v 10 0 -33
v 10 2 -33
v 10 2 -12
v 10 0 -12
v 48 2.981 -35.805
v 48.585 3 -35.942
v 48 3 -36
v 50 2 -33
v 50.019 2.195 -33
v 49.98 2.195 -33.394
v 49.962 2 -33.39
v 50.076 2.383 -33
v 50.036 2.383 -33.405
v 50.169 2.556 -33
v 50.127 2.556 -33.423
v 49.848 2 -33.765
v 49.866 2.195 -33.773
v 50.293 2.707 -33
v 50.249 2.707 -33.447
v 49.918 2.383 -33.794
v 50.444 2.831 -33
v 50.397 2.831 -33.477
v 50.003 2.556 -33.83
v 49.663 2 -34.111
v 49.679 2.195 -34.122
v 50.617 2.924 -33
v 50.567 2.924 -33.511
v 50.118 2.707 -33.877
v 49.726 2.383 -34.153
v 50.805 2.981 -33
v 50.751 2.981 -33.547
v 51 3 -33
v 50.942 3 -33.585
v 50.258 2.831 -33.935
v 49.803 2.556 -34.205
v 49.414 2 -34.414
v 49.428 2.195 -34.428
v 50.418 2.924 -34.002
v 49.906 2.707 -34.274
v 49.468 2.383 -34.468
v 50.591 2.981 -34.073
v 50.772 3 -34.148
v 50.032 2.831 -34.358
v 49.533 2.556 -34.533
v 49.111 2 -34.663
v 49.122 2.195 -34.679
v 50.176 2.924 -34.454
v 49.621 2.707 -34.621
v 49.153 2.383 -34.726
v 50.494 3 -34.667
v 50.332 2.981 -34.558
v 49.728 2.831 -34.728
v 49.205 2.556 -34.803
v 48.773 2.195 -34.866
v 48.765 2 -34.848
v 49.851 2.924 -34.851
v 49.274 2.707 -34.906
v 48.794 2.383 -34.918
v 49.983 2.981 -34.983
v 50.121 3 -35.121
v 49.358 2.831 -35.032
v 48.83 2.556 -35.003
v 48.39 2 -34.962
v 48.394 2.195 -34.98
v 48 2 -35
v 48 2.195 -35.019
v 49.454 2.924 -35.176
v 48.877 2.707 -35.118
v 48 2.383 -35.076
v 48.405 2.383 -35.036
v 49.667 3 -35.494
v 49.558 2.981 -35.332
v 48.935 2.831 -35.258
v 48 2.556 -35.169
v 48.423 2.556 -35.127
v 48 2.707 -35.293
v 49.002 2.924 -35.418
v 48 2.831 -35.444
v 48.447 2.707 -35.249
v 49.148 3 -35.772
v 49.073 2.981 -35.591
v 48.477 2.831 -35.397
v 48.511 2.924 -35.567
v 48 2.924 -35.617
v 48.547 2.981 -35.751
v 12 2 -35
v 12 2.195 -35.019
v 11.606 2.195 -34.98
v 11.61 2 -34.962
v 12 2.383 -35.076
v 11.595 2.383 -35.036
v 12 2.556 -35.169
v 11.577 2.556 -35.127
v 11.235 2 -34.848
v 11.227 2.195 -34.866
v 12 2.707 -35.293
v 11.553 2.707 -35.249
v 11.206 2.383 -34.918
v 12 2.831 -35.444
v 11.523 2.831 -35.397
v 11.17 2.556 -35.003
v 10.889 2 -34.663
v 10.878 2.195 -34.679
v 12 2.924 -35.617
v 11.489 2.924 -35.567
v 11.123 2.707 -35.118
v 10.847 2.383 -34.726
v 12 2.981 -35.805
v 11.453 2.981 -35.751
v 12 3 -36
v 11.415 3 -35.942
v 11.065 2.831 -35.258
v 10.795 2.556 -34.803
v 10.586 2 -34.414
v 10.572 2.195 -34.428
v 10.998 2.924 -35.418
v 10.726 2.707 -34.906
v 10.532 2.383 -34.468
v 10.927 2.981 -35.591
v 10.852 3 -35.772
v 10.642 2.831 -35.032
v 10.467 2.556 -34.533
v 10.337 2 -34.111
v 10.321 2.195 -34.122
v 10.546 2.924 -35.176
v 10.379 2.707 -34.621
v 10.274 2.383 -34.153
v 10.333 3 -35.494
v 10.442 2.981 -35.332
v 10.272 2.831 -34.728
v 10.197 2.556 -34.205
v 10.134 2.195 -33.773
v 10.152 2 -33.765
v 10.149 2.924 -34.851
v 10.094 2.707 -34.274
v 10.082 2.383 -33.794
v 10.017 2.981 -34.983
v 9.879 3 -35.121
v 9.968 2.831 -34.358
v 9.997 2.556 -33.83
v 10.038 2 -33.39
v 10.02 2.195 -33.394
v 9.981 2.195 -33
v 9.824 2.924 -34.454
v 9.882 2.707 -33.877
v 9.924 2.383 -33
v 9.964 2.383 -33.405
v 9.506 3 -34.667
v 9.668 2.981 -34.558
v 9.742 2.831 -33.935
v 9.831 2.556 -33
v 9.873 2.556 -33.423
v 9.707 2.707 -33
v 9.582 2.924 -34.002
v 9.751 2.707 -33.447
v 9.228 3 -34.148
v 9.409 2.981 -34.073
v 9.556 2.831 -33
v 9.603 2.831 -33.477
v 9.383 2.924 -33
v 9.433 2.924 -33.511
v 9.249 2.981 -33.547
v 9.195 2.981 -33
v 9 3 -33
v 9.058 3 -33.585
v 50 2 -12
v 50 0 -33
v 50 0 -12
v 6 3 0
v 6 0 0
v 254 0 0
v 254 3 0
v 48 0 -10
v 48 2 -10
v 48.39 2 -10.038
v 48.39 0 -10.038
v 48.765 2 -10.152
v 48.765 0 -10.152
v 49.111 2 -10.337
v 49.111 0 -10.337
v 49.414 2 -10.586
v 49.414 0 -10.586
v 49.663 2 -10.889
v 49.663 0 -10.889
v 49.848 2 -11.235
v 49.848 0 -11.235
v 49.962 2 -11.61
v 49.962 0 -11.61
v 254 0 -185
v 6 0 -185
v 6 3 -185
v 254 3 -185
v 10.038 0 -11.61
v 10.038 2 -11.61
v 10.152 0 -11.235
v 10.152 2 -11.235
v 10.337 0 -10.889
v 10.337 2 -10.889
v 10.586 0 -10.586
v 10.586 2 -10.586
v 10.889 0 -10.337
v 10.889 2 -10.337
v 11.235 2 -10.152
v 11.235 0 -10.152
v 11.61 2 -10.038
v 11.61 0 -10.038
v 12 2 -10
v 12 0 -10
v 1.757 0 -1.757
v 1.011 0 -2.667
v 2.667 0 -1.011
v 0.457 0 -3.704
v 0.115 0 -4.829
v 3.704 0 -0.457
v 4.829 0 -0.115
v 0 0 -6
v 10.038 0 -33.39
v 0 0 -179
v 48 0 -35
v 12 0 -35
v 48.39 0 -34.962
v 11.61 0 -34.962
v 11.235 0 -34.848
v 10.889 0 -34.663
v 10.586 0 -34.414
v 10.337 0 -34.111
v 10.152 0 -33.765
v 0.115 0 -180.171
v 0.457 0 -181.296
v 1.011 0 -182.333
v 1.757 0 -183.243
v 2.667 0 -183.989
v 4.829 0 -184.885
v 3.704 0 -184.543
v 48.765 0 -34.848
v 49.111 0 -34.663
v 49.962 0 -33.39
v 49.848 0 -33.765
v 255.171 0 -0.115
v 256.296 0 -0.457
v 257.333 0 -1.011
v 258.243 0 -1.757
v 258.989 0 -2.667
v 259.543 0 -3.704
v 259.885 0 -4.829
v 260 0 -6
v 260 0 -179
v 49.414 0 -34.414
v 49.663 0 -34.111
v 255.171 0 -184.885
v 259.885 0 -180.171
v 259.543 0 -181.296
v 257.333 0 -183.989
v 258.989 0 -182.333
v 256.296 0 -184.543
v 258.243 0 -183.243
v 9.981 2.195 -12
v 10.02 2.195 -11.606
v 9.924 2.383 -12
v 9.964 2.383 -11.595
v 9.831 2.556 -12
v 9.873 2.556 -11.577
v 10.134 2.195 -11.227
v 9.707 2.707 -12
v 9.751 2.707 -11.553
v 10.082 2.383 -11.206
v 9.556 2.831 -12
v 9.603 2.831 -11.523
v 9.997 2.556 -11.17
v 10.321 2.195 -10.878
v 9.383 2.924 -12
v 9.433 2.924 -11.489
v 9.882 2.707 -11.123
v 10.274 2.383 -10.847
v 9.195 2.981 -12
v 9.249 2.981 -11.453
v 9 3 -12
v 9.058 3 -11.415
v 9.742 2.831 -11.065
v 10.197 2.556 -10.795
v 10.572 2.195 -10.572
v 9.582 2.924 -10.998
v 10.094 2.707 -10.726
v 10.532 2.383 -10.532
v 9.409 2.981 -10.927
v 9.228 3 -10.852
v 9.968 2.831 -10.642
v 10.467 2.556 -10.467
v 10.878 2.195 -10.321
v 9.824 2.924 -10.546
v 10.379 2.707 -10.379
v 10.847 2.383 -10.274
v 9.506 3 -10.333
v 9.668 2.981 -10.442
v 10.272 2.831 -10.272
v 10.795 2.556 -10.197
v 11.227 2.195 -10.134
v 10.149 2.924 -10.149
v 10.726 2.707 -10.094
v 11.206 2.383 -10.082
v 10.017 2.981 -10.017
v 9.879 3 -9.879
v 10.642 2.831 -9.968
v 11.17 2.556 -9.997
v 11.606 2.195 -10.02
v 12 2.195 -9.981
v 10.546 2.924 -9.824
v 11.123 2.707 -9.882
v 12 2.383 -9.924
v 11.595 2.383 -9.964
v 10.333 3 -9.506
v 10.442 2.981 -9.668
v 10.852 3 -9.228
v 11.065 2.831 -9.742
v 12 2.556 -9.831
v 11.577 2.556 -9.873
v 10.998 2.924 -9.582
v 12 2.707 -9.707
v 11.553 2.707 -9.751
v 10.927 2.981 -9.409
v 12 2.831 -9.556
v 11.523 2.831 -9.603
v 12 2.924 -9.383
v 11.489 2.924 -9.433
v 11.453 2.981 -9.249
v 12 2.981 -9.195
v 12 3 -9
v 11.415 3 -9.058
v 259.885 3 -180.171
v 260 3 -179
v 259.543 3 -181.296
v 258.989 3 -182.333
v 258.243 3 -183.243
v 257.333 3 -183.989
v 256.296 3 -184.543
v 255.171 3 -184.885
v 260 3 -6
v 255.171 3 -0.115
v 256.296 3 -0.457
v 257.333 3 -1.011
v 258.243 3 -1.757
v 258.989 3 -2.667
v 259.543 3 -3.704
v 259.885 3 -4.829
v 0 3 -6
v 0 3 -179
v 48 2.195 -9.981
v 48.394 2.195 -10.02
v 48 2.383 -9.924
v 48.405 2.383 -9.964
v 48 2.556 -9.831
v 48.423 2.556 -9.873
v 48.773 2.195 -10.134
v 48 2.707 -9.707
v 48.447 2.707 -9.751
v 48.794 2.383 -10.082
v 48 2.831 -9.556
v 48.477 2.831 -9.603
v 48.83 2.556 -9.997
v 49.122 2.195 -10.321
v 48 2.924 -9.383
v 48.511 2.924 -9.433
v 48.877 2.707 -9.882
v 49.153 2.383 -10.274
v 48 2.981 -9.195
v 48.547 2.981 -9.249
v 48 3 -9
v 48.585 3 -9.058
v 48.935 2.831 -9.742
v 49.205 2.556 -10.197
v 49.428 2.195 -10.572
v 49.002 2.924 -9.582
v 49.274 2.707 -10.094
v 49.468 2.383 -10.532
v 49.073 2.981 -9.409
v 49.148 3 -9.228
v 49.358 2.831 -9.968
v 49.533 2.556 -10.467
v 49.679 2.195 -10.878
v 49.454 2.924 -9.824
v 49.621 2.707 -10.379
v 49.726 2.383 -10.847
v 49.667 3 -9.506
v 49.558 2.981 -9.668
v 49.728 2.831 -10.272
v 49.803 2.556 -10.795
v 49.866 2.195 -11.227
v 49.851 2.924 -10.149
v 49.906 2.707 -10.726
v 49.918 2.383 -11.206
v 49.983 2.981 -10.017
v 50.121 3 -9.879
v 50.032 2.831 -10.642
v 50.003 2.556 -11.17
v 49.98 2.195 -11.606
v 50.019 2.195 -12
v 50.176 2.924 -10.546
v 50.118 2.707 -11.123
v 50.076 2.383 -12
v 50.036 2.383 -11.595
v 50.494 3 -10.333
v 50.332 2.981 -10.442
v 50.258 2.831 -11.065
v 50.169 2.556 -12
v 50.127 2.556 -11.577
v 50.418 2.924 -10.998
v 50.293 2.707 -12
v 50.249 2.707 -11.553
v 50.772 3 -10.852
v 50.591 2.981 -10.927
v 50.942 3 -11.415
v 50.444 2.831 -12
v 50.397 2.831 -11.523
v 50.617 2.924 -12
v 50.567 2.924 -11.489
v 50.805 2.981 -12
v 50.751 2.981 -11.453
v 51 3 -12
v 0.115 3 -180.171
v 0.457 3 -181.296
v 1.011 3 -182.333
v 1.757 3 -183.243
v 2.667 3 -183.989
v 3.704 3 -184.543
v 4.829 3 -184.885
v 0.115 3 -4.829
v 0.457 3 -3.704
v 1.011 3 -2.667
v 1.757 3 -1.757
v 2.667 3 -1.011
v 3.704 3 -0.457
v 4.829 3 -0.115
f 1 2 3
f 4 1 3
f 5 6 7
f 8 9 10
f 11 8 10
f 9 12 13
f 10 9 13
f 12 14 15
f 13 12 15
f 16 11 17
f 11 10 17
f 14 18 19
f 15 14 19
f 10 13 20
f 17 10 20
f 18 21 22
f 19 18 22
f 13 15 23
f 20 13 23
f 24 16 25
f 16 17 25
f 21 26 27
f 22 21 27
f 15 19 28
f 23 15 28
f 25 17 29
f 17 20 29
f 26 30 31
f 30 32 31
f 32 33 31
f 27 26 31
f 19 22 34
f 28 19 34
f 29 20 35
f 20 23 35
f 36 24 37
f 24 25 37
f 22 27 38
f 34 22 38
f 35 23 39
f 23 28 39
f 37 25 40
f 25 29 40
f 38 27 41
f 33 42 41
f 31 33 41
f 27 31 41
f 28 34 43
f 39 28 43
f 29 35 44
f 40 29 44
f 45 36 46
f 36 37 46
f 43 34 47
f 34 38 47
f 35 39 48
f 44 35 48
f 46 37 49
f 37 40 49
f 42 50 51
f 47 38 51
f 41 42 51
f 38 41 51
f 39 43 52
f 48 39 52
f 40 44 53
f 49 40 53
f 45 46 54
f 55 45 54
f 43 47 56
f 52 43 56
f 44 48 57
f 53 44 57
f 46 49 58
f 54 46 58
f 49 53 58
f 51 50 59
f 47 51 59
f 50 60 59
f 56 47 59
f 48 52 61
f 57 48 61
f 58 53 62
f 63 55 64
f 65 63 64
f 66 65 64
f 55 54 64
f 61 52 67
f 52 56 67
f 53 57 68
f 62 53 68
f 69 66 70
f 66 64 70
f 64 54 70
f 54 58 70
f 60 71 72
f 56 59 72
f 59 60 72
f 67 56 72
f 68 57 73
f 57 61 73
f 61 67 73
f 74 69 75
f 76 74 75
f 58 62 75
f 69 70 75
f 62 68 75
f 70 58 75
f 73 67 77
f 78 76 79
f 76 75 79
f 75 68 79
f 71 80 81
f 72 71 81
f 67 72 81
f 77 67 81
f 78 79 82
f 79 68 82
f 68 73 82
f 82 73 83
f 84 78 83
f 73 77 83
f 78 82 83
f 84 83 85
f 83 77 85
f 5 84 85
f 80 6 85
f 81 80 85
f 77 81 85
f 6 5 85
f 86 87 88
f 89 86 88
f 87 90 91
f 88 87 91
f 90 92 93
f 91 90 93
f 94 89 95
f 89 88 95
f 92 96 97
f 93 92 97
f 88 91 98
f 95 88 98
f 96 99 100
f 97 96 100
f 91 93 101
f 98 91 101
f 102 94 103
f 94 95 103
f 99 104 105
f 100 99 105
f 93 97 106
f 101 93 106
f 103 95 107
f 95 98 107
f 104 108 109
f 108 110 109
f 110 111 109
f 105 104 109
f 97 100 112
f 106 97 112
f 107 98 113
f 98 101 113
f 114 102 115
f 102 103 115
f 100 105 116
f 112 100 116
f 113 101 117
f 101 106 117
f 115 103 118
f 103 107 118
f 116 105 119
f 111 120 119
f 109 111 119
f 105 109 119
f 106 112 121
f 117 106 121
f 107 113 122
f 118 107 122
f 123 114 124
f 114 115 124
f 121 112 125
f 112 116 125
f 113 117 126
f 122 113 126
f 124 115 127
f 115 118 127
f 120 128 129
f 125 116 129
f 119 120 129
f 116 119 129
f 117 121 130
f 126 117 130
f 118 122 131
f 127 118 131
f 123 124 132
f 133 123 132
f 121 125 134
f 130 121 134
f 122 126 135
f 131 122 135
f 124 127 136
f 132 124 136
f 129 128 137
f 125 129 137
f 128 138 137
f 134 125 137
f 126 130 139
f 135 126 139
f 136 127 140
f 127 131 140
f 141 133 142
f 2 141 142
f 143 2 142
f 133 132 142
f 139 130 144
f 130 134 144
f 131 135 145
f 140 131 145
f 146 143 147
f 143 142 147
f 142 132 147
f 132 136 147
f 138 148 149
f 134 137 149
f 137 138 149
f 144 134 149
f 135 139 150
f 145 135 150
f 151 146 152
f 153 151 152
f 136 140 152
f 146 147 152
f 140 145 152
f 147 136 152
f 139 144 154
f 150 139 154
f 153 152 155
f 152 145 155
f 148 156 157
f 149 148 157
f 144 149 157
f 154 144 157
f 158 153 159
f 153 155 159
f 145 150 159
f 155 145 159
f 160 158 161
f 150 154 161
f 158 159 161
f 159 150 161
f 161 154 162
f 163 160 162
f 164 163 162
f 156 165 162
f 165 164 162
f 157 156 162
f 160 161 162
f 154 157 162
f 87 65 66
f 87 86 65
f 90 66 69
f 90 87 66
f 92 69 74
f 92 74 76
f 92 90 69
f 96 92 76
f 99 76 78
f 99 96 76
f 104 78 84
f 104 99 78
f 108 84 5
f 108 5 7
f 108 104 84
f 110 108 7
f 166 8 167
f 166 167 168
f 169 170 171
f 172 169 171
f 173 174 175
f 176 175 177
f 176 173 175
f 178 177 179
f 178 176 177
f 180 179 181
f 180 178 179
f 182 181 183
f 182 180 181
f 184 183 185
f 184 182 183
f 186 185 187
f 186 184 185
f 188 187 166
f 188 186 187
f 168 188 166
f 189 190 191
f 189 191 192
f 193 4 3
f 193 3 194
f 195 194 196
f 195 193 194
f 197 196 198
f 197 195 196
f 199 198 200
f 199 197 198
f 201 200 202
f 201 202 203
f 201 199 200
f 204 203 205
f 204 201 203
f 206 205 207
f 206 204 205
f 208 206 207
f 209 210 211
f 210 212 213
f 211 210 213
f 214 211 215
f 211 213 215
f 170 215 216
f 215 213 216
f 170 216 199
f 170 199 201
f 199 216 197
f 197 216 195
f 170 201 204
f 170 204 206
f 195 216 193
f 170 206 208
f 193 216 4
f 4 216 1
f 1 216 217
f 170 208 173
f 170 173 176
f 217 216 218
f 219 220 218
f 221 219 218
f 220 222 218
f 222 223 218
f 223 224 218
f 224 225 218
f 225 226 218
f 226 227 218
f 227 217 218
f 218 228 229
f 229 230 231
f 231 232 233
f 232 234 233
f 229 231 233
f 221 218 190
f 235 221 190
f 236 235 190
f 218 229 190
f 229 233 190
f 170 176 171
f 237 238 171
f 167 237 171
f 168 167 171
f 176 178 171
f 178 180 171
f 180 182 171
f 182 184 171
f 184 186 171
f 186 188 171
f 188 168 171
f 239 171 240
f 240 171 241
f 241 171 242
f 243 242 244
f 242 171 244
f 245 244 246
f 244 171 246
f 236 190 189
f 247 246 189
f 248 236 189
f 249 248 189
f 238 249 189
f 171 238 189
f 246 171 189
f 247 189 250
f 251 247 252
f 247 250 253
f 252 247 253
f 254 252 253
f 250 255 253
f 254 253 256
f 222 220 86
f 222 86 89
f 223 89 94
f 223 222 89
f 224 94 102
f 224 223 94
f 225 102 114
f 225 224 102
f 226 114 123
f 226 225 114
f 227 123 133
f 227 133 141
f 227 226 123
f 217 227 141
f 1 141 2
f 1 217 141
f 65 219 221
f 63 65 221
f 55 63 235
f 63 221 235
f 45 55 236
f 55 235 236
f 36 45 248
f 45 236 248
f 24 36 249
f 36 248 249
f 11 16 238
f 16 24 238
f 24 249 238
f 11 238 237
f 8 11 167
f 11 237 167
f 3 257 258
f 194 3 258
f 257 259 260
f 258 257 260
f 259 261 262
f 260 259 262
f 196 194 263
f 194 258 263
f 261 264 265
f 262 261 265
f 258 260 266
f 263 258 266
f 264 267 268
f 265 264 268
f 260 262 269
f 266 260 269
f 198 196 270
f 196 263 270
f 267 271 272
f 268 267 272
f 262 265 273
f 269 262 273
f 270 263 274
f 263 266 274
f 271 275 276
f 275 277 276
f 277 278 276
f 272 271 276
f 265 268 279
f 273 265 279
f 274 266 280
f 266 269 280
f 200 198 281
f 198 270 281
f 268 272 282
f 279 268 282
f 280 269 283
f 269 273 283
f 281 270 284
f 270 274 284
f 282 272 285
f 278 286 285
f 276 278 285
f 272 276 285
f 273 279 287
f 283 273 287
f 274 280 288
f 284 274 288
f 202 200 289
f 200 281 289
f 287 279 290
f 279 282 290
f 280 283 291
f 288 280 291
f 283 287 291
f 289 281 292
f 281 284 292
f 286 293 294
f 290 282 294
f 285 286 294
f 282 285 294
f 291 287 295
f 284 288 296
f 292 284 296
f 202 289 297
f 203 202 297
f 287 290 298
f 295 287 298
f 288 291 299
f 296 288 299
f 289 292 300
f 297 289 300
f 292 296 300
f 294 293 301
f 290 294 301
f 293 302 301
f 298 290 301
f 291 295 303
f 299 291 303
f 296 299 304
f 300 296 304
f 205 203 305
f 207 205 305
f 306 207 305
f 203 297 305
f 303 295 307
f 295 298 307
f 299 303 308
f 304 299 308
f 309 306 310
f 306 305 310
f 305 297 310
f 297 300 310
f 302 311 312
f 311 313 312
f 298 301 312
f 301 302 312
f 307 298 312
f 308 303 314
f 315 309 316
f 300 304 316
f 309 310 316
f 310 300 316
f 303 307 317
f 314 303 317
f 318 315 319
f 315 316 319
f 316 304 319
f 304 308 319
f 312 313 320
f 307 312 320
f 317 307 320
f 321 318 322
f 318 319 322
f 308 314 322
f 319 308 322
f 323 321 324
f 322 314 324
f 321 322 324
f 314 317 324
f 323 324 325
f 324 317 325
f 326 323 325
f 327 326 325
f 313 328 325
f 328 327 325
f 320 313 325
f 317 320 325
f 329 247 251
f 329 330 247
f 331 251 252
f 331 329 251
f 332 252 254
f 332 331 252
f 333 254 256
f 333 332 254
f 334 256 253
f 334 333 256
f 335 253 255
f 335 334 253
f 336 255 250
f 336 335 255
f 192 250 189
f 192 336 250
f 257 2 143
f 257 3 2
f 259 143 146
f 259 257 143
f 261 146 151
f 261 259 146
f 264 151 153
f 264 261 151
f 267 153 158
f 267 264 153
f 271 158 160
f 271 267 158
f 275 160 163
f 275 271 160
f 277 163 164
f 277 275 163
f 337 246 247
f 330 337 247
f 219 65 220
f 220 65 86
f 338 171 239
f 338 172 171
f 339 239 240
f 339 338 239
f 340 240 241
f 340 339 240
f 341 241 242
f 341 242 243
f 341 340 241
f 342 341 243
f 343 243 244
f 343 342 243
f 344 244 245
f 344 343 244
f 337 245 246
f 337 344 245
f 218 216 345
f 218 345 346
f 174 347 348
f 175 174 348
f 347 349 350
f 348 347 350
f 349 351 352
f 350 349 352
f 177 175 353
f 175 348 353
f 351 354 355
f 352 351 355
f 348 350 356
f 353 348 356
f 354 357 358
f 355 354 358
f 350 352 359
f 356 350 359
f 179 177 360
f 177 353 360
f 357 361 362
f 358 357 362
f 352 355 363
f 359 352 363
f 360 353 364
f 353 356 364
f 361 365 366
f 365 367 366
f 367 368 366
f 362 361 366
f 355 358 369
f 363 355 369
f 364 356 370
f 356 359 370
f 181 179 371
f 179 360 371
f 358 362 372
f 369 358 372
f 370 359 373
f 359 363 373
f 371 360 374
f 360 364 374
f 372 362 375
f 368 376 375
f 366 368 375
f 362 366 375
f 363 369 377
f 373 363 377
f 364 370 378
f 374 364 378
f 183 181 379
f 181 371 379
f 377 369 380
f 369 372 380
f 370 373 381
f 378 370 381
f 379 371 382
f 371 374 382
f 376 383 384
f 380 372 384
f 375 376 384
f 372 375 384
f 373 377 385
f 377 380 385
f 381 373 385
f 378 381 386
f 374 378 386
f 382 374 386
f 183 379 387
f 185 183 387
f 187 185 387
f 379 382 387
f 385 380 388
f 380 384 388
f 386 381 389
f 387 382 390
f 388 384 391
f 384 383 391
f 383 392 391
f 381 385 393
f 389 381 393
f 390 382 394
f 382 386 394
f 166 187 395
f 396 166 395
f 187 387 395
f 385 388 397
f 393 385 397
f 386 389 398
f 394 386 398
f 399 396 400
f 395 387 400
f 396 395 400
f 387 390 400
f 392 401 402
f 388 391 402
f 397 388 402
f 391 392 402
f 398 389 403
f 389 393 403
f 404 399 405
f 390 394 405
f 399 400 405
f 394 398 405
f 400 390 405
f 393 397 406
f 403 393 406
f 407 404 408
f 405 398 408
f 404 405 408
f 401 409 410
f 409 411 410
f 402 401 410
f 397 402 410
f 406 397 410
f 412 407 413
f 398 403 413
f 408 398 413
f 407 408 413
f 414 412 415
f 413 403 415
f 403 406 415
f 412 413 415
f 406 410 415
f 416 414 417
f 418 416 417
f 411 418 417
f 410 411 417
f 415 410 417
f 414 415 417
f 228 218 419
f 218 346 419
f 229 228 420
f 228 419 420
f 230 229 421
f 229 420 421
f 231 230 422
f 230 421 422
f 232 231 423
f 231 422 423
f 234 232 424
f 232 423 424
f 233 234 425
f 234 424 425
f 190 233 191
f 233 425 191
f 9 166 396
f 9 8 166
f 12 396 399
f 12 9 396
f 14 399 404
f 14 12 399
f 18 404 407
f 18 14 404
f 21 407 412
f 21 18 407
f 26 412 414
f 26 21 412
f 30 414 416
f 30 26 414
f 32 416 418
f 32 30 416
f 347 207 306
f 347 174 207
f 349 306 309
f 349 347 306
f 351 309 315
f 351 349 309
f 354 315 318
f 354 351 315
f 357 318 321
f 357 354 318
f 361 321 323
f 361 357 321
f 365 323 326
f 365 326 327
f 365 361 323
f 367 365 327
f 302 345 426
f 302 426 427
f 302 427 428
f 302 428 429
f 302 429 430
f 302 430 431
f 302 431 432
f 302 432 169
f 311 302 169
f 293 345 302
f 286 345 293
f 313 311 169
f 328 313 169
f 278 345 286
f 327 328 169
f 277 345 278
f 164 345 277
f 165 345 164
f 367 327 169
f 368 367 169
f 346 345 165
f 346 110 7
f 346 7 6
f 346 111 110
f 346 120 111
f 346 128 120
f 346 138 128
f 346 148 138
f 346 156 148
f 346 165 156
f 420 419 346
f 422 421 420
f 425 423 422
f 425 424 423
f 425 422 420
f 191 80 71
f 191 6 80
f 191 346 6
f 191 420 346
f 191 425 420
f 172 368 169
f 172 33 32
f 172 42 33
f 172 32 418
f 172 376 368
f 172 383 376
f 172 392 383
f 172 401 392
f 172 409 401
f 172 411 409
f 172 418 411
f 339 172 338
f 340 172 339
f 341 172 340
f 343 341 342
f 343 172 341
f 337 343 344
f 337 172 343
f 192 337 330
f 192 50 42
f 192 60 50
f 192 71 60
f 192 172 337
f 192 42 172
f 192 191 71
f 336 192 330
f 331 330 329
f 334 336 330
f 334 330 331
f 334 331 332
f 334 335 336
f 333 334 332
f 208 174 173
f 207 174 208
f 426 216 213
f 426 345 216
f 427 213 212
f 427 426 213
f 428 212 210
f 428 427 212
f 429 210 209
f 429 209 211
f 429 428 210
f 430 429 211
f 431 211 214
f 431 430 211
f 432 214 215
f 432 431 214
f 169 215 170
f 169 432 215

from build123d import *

# Parameters (mm, degrees)
SKETCH1_W          = 260
SKETCH1_H          = 185
EXTRUDE1_DEPTH     = 3
FILLET3_R          = 6
SKETCH2_W          = 40
SKETCH2_H          = 25
CUT_EXTRUDE1_DEPTH = 320.11439955
FILLET1_R          = 2
FILLET2_R          = 1


with BuildPart() as part:
    # Sketch1 → Extrude1 (new body)
    with BuildSketch(Plane(origin=(0, 0, 0), x_dir=(1, 0, 0), z_dir=(0, 1, 0))):
        with Locations((130, 92.5)):
            Rectangle(SKETCH1_W, SKETCH1_H)
    extrude(amount=EXTRUDE1_DEPTH)

    # Fillet3
    fillet3_edges = [part.edges().sort_by_distance(p)[0] for p in [
        (0, 1.5, -185),
        (260, 1.5, -185),
        (260, 1.5, 0),
        (0, 1.5, 0),
    ]]
    fillet(fillet3_edges, radius=FILLET3_R)

    # Sketch2 → Cut-Extrude1 (cut, through all)
    with BuildSketch(Plane(origin=(0, 3, 0), x_dir=(-1, 0, 0), z_dir=(0, 1, 0))):
        with Locations((-30, -22.5)):
            Rectangle(SKETCH2_W, SKETCH2_H)
    extrude(amount=-CUT_EXTRUDE1_DEPTH, mode=Mode.SUBTRACT)

    # Fillet1
    fillet1_edges = [part.edges().sort_by_distance(p)[0] for p in [
        (10, 1.5, -10),
        (10, 1.5, -35),
        (50, 1.5, -35),
        (50, 1.5, -10),
    ]]
    fillet(fillet1_edges, radius=FILLET1_R)

    # Fillet2
    fillet2_edges = [part.edges().sort_by_distance(p)[0] for p in [
        (30, 3, -35),
        (50, 3, -22.5),
        (30, 3, -10),
        (10, 3, -22.5),
        (49.414213562, 3, -34.414213562),
        (49.414213562, 3, -10.585786438),
        (10.585786438, 3, -10.585786438),
        (10.585786438, 3, -34.414213562),
    ]]
    fillet(fillet2_edges, radius=FILLET2_R)


solid = part.part
